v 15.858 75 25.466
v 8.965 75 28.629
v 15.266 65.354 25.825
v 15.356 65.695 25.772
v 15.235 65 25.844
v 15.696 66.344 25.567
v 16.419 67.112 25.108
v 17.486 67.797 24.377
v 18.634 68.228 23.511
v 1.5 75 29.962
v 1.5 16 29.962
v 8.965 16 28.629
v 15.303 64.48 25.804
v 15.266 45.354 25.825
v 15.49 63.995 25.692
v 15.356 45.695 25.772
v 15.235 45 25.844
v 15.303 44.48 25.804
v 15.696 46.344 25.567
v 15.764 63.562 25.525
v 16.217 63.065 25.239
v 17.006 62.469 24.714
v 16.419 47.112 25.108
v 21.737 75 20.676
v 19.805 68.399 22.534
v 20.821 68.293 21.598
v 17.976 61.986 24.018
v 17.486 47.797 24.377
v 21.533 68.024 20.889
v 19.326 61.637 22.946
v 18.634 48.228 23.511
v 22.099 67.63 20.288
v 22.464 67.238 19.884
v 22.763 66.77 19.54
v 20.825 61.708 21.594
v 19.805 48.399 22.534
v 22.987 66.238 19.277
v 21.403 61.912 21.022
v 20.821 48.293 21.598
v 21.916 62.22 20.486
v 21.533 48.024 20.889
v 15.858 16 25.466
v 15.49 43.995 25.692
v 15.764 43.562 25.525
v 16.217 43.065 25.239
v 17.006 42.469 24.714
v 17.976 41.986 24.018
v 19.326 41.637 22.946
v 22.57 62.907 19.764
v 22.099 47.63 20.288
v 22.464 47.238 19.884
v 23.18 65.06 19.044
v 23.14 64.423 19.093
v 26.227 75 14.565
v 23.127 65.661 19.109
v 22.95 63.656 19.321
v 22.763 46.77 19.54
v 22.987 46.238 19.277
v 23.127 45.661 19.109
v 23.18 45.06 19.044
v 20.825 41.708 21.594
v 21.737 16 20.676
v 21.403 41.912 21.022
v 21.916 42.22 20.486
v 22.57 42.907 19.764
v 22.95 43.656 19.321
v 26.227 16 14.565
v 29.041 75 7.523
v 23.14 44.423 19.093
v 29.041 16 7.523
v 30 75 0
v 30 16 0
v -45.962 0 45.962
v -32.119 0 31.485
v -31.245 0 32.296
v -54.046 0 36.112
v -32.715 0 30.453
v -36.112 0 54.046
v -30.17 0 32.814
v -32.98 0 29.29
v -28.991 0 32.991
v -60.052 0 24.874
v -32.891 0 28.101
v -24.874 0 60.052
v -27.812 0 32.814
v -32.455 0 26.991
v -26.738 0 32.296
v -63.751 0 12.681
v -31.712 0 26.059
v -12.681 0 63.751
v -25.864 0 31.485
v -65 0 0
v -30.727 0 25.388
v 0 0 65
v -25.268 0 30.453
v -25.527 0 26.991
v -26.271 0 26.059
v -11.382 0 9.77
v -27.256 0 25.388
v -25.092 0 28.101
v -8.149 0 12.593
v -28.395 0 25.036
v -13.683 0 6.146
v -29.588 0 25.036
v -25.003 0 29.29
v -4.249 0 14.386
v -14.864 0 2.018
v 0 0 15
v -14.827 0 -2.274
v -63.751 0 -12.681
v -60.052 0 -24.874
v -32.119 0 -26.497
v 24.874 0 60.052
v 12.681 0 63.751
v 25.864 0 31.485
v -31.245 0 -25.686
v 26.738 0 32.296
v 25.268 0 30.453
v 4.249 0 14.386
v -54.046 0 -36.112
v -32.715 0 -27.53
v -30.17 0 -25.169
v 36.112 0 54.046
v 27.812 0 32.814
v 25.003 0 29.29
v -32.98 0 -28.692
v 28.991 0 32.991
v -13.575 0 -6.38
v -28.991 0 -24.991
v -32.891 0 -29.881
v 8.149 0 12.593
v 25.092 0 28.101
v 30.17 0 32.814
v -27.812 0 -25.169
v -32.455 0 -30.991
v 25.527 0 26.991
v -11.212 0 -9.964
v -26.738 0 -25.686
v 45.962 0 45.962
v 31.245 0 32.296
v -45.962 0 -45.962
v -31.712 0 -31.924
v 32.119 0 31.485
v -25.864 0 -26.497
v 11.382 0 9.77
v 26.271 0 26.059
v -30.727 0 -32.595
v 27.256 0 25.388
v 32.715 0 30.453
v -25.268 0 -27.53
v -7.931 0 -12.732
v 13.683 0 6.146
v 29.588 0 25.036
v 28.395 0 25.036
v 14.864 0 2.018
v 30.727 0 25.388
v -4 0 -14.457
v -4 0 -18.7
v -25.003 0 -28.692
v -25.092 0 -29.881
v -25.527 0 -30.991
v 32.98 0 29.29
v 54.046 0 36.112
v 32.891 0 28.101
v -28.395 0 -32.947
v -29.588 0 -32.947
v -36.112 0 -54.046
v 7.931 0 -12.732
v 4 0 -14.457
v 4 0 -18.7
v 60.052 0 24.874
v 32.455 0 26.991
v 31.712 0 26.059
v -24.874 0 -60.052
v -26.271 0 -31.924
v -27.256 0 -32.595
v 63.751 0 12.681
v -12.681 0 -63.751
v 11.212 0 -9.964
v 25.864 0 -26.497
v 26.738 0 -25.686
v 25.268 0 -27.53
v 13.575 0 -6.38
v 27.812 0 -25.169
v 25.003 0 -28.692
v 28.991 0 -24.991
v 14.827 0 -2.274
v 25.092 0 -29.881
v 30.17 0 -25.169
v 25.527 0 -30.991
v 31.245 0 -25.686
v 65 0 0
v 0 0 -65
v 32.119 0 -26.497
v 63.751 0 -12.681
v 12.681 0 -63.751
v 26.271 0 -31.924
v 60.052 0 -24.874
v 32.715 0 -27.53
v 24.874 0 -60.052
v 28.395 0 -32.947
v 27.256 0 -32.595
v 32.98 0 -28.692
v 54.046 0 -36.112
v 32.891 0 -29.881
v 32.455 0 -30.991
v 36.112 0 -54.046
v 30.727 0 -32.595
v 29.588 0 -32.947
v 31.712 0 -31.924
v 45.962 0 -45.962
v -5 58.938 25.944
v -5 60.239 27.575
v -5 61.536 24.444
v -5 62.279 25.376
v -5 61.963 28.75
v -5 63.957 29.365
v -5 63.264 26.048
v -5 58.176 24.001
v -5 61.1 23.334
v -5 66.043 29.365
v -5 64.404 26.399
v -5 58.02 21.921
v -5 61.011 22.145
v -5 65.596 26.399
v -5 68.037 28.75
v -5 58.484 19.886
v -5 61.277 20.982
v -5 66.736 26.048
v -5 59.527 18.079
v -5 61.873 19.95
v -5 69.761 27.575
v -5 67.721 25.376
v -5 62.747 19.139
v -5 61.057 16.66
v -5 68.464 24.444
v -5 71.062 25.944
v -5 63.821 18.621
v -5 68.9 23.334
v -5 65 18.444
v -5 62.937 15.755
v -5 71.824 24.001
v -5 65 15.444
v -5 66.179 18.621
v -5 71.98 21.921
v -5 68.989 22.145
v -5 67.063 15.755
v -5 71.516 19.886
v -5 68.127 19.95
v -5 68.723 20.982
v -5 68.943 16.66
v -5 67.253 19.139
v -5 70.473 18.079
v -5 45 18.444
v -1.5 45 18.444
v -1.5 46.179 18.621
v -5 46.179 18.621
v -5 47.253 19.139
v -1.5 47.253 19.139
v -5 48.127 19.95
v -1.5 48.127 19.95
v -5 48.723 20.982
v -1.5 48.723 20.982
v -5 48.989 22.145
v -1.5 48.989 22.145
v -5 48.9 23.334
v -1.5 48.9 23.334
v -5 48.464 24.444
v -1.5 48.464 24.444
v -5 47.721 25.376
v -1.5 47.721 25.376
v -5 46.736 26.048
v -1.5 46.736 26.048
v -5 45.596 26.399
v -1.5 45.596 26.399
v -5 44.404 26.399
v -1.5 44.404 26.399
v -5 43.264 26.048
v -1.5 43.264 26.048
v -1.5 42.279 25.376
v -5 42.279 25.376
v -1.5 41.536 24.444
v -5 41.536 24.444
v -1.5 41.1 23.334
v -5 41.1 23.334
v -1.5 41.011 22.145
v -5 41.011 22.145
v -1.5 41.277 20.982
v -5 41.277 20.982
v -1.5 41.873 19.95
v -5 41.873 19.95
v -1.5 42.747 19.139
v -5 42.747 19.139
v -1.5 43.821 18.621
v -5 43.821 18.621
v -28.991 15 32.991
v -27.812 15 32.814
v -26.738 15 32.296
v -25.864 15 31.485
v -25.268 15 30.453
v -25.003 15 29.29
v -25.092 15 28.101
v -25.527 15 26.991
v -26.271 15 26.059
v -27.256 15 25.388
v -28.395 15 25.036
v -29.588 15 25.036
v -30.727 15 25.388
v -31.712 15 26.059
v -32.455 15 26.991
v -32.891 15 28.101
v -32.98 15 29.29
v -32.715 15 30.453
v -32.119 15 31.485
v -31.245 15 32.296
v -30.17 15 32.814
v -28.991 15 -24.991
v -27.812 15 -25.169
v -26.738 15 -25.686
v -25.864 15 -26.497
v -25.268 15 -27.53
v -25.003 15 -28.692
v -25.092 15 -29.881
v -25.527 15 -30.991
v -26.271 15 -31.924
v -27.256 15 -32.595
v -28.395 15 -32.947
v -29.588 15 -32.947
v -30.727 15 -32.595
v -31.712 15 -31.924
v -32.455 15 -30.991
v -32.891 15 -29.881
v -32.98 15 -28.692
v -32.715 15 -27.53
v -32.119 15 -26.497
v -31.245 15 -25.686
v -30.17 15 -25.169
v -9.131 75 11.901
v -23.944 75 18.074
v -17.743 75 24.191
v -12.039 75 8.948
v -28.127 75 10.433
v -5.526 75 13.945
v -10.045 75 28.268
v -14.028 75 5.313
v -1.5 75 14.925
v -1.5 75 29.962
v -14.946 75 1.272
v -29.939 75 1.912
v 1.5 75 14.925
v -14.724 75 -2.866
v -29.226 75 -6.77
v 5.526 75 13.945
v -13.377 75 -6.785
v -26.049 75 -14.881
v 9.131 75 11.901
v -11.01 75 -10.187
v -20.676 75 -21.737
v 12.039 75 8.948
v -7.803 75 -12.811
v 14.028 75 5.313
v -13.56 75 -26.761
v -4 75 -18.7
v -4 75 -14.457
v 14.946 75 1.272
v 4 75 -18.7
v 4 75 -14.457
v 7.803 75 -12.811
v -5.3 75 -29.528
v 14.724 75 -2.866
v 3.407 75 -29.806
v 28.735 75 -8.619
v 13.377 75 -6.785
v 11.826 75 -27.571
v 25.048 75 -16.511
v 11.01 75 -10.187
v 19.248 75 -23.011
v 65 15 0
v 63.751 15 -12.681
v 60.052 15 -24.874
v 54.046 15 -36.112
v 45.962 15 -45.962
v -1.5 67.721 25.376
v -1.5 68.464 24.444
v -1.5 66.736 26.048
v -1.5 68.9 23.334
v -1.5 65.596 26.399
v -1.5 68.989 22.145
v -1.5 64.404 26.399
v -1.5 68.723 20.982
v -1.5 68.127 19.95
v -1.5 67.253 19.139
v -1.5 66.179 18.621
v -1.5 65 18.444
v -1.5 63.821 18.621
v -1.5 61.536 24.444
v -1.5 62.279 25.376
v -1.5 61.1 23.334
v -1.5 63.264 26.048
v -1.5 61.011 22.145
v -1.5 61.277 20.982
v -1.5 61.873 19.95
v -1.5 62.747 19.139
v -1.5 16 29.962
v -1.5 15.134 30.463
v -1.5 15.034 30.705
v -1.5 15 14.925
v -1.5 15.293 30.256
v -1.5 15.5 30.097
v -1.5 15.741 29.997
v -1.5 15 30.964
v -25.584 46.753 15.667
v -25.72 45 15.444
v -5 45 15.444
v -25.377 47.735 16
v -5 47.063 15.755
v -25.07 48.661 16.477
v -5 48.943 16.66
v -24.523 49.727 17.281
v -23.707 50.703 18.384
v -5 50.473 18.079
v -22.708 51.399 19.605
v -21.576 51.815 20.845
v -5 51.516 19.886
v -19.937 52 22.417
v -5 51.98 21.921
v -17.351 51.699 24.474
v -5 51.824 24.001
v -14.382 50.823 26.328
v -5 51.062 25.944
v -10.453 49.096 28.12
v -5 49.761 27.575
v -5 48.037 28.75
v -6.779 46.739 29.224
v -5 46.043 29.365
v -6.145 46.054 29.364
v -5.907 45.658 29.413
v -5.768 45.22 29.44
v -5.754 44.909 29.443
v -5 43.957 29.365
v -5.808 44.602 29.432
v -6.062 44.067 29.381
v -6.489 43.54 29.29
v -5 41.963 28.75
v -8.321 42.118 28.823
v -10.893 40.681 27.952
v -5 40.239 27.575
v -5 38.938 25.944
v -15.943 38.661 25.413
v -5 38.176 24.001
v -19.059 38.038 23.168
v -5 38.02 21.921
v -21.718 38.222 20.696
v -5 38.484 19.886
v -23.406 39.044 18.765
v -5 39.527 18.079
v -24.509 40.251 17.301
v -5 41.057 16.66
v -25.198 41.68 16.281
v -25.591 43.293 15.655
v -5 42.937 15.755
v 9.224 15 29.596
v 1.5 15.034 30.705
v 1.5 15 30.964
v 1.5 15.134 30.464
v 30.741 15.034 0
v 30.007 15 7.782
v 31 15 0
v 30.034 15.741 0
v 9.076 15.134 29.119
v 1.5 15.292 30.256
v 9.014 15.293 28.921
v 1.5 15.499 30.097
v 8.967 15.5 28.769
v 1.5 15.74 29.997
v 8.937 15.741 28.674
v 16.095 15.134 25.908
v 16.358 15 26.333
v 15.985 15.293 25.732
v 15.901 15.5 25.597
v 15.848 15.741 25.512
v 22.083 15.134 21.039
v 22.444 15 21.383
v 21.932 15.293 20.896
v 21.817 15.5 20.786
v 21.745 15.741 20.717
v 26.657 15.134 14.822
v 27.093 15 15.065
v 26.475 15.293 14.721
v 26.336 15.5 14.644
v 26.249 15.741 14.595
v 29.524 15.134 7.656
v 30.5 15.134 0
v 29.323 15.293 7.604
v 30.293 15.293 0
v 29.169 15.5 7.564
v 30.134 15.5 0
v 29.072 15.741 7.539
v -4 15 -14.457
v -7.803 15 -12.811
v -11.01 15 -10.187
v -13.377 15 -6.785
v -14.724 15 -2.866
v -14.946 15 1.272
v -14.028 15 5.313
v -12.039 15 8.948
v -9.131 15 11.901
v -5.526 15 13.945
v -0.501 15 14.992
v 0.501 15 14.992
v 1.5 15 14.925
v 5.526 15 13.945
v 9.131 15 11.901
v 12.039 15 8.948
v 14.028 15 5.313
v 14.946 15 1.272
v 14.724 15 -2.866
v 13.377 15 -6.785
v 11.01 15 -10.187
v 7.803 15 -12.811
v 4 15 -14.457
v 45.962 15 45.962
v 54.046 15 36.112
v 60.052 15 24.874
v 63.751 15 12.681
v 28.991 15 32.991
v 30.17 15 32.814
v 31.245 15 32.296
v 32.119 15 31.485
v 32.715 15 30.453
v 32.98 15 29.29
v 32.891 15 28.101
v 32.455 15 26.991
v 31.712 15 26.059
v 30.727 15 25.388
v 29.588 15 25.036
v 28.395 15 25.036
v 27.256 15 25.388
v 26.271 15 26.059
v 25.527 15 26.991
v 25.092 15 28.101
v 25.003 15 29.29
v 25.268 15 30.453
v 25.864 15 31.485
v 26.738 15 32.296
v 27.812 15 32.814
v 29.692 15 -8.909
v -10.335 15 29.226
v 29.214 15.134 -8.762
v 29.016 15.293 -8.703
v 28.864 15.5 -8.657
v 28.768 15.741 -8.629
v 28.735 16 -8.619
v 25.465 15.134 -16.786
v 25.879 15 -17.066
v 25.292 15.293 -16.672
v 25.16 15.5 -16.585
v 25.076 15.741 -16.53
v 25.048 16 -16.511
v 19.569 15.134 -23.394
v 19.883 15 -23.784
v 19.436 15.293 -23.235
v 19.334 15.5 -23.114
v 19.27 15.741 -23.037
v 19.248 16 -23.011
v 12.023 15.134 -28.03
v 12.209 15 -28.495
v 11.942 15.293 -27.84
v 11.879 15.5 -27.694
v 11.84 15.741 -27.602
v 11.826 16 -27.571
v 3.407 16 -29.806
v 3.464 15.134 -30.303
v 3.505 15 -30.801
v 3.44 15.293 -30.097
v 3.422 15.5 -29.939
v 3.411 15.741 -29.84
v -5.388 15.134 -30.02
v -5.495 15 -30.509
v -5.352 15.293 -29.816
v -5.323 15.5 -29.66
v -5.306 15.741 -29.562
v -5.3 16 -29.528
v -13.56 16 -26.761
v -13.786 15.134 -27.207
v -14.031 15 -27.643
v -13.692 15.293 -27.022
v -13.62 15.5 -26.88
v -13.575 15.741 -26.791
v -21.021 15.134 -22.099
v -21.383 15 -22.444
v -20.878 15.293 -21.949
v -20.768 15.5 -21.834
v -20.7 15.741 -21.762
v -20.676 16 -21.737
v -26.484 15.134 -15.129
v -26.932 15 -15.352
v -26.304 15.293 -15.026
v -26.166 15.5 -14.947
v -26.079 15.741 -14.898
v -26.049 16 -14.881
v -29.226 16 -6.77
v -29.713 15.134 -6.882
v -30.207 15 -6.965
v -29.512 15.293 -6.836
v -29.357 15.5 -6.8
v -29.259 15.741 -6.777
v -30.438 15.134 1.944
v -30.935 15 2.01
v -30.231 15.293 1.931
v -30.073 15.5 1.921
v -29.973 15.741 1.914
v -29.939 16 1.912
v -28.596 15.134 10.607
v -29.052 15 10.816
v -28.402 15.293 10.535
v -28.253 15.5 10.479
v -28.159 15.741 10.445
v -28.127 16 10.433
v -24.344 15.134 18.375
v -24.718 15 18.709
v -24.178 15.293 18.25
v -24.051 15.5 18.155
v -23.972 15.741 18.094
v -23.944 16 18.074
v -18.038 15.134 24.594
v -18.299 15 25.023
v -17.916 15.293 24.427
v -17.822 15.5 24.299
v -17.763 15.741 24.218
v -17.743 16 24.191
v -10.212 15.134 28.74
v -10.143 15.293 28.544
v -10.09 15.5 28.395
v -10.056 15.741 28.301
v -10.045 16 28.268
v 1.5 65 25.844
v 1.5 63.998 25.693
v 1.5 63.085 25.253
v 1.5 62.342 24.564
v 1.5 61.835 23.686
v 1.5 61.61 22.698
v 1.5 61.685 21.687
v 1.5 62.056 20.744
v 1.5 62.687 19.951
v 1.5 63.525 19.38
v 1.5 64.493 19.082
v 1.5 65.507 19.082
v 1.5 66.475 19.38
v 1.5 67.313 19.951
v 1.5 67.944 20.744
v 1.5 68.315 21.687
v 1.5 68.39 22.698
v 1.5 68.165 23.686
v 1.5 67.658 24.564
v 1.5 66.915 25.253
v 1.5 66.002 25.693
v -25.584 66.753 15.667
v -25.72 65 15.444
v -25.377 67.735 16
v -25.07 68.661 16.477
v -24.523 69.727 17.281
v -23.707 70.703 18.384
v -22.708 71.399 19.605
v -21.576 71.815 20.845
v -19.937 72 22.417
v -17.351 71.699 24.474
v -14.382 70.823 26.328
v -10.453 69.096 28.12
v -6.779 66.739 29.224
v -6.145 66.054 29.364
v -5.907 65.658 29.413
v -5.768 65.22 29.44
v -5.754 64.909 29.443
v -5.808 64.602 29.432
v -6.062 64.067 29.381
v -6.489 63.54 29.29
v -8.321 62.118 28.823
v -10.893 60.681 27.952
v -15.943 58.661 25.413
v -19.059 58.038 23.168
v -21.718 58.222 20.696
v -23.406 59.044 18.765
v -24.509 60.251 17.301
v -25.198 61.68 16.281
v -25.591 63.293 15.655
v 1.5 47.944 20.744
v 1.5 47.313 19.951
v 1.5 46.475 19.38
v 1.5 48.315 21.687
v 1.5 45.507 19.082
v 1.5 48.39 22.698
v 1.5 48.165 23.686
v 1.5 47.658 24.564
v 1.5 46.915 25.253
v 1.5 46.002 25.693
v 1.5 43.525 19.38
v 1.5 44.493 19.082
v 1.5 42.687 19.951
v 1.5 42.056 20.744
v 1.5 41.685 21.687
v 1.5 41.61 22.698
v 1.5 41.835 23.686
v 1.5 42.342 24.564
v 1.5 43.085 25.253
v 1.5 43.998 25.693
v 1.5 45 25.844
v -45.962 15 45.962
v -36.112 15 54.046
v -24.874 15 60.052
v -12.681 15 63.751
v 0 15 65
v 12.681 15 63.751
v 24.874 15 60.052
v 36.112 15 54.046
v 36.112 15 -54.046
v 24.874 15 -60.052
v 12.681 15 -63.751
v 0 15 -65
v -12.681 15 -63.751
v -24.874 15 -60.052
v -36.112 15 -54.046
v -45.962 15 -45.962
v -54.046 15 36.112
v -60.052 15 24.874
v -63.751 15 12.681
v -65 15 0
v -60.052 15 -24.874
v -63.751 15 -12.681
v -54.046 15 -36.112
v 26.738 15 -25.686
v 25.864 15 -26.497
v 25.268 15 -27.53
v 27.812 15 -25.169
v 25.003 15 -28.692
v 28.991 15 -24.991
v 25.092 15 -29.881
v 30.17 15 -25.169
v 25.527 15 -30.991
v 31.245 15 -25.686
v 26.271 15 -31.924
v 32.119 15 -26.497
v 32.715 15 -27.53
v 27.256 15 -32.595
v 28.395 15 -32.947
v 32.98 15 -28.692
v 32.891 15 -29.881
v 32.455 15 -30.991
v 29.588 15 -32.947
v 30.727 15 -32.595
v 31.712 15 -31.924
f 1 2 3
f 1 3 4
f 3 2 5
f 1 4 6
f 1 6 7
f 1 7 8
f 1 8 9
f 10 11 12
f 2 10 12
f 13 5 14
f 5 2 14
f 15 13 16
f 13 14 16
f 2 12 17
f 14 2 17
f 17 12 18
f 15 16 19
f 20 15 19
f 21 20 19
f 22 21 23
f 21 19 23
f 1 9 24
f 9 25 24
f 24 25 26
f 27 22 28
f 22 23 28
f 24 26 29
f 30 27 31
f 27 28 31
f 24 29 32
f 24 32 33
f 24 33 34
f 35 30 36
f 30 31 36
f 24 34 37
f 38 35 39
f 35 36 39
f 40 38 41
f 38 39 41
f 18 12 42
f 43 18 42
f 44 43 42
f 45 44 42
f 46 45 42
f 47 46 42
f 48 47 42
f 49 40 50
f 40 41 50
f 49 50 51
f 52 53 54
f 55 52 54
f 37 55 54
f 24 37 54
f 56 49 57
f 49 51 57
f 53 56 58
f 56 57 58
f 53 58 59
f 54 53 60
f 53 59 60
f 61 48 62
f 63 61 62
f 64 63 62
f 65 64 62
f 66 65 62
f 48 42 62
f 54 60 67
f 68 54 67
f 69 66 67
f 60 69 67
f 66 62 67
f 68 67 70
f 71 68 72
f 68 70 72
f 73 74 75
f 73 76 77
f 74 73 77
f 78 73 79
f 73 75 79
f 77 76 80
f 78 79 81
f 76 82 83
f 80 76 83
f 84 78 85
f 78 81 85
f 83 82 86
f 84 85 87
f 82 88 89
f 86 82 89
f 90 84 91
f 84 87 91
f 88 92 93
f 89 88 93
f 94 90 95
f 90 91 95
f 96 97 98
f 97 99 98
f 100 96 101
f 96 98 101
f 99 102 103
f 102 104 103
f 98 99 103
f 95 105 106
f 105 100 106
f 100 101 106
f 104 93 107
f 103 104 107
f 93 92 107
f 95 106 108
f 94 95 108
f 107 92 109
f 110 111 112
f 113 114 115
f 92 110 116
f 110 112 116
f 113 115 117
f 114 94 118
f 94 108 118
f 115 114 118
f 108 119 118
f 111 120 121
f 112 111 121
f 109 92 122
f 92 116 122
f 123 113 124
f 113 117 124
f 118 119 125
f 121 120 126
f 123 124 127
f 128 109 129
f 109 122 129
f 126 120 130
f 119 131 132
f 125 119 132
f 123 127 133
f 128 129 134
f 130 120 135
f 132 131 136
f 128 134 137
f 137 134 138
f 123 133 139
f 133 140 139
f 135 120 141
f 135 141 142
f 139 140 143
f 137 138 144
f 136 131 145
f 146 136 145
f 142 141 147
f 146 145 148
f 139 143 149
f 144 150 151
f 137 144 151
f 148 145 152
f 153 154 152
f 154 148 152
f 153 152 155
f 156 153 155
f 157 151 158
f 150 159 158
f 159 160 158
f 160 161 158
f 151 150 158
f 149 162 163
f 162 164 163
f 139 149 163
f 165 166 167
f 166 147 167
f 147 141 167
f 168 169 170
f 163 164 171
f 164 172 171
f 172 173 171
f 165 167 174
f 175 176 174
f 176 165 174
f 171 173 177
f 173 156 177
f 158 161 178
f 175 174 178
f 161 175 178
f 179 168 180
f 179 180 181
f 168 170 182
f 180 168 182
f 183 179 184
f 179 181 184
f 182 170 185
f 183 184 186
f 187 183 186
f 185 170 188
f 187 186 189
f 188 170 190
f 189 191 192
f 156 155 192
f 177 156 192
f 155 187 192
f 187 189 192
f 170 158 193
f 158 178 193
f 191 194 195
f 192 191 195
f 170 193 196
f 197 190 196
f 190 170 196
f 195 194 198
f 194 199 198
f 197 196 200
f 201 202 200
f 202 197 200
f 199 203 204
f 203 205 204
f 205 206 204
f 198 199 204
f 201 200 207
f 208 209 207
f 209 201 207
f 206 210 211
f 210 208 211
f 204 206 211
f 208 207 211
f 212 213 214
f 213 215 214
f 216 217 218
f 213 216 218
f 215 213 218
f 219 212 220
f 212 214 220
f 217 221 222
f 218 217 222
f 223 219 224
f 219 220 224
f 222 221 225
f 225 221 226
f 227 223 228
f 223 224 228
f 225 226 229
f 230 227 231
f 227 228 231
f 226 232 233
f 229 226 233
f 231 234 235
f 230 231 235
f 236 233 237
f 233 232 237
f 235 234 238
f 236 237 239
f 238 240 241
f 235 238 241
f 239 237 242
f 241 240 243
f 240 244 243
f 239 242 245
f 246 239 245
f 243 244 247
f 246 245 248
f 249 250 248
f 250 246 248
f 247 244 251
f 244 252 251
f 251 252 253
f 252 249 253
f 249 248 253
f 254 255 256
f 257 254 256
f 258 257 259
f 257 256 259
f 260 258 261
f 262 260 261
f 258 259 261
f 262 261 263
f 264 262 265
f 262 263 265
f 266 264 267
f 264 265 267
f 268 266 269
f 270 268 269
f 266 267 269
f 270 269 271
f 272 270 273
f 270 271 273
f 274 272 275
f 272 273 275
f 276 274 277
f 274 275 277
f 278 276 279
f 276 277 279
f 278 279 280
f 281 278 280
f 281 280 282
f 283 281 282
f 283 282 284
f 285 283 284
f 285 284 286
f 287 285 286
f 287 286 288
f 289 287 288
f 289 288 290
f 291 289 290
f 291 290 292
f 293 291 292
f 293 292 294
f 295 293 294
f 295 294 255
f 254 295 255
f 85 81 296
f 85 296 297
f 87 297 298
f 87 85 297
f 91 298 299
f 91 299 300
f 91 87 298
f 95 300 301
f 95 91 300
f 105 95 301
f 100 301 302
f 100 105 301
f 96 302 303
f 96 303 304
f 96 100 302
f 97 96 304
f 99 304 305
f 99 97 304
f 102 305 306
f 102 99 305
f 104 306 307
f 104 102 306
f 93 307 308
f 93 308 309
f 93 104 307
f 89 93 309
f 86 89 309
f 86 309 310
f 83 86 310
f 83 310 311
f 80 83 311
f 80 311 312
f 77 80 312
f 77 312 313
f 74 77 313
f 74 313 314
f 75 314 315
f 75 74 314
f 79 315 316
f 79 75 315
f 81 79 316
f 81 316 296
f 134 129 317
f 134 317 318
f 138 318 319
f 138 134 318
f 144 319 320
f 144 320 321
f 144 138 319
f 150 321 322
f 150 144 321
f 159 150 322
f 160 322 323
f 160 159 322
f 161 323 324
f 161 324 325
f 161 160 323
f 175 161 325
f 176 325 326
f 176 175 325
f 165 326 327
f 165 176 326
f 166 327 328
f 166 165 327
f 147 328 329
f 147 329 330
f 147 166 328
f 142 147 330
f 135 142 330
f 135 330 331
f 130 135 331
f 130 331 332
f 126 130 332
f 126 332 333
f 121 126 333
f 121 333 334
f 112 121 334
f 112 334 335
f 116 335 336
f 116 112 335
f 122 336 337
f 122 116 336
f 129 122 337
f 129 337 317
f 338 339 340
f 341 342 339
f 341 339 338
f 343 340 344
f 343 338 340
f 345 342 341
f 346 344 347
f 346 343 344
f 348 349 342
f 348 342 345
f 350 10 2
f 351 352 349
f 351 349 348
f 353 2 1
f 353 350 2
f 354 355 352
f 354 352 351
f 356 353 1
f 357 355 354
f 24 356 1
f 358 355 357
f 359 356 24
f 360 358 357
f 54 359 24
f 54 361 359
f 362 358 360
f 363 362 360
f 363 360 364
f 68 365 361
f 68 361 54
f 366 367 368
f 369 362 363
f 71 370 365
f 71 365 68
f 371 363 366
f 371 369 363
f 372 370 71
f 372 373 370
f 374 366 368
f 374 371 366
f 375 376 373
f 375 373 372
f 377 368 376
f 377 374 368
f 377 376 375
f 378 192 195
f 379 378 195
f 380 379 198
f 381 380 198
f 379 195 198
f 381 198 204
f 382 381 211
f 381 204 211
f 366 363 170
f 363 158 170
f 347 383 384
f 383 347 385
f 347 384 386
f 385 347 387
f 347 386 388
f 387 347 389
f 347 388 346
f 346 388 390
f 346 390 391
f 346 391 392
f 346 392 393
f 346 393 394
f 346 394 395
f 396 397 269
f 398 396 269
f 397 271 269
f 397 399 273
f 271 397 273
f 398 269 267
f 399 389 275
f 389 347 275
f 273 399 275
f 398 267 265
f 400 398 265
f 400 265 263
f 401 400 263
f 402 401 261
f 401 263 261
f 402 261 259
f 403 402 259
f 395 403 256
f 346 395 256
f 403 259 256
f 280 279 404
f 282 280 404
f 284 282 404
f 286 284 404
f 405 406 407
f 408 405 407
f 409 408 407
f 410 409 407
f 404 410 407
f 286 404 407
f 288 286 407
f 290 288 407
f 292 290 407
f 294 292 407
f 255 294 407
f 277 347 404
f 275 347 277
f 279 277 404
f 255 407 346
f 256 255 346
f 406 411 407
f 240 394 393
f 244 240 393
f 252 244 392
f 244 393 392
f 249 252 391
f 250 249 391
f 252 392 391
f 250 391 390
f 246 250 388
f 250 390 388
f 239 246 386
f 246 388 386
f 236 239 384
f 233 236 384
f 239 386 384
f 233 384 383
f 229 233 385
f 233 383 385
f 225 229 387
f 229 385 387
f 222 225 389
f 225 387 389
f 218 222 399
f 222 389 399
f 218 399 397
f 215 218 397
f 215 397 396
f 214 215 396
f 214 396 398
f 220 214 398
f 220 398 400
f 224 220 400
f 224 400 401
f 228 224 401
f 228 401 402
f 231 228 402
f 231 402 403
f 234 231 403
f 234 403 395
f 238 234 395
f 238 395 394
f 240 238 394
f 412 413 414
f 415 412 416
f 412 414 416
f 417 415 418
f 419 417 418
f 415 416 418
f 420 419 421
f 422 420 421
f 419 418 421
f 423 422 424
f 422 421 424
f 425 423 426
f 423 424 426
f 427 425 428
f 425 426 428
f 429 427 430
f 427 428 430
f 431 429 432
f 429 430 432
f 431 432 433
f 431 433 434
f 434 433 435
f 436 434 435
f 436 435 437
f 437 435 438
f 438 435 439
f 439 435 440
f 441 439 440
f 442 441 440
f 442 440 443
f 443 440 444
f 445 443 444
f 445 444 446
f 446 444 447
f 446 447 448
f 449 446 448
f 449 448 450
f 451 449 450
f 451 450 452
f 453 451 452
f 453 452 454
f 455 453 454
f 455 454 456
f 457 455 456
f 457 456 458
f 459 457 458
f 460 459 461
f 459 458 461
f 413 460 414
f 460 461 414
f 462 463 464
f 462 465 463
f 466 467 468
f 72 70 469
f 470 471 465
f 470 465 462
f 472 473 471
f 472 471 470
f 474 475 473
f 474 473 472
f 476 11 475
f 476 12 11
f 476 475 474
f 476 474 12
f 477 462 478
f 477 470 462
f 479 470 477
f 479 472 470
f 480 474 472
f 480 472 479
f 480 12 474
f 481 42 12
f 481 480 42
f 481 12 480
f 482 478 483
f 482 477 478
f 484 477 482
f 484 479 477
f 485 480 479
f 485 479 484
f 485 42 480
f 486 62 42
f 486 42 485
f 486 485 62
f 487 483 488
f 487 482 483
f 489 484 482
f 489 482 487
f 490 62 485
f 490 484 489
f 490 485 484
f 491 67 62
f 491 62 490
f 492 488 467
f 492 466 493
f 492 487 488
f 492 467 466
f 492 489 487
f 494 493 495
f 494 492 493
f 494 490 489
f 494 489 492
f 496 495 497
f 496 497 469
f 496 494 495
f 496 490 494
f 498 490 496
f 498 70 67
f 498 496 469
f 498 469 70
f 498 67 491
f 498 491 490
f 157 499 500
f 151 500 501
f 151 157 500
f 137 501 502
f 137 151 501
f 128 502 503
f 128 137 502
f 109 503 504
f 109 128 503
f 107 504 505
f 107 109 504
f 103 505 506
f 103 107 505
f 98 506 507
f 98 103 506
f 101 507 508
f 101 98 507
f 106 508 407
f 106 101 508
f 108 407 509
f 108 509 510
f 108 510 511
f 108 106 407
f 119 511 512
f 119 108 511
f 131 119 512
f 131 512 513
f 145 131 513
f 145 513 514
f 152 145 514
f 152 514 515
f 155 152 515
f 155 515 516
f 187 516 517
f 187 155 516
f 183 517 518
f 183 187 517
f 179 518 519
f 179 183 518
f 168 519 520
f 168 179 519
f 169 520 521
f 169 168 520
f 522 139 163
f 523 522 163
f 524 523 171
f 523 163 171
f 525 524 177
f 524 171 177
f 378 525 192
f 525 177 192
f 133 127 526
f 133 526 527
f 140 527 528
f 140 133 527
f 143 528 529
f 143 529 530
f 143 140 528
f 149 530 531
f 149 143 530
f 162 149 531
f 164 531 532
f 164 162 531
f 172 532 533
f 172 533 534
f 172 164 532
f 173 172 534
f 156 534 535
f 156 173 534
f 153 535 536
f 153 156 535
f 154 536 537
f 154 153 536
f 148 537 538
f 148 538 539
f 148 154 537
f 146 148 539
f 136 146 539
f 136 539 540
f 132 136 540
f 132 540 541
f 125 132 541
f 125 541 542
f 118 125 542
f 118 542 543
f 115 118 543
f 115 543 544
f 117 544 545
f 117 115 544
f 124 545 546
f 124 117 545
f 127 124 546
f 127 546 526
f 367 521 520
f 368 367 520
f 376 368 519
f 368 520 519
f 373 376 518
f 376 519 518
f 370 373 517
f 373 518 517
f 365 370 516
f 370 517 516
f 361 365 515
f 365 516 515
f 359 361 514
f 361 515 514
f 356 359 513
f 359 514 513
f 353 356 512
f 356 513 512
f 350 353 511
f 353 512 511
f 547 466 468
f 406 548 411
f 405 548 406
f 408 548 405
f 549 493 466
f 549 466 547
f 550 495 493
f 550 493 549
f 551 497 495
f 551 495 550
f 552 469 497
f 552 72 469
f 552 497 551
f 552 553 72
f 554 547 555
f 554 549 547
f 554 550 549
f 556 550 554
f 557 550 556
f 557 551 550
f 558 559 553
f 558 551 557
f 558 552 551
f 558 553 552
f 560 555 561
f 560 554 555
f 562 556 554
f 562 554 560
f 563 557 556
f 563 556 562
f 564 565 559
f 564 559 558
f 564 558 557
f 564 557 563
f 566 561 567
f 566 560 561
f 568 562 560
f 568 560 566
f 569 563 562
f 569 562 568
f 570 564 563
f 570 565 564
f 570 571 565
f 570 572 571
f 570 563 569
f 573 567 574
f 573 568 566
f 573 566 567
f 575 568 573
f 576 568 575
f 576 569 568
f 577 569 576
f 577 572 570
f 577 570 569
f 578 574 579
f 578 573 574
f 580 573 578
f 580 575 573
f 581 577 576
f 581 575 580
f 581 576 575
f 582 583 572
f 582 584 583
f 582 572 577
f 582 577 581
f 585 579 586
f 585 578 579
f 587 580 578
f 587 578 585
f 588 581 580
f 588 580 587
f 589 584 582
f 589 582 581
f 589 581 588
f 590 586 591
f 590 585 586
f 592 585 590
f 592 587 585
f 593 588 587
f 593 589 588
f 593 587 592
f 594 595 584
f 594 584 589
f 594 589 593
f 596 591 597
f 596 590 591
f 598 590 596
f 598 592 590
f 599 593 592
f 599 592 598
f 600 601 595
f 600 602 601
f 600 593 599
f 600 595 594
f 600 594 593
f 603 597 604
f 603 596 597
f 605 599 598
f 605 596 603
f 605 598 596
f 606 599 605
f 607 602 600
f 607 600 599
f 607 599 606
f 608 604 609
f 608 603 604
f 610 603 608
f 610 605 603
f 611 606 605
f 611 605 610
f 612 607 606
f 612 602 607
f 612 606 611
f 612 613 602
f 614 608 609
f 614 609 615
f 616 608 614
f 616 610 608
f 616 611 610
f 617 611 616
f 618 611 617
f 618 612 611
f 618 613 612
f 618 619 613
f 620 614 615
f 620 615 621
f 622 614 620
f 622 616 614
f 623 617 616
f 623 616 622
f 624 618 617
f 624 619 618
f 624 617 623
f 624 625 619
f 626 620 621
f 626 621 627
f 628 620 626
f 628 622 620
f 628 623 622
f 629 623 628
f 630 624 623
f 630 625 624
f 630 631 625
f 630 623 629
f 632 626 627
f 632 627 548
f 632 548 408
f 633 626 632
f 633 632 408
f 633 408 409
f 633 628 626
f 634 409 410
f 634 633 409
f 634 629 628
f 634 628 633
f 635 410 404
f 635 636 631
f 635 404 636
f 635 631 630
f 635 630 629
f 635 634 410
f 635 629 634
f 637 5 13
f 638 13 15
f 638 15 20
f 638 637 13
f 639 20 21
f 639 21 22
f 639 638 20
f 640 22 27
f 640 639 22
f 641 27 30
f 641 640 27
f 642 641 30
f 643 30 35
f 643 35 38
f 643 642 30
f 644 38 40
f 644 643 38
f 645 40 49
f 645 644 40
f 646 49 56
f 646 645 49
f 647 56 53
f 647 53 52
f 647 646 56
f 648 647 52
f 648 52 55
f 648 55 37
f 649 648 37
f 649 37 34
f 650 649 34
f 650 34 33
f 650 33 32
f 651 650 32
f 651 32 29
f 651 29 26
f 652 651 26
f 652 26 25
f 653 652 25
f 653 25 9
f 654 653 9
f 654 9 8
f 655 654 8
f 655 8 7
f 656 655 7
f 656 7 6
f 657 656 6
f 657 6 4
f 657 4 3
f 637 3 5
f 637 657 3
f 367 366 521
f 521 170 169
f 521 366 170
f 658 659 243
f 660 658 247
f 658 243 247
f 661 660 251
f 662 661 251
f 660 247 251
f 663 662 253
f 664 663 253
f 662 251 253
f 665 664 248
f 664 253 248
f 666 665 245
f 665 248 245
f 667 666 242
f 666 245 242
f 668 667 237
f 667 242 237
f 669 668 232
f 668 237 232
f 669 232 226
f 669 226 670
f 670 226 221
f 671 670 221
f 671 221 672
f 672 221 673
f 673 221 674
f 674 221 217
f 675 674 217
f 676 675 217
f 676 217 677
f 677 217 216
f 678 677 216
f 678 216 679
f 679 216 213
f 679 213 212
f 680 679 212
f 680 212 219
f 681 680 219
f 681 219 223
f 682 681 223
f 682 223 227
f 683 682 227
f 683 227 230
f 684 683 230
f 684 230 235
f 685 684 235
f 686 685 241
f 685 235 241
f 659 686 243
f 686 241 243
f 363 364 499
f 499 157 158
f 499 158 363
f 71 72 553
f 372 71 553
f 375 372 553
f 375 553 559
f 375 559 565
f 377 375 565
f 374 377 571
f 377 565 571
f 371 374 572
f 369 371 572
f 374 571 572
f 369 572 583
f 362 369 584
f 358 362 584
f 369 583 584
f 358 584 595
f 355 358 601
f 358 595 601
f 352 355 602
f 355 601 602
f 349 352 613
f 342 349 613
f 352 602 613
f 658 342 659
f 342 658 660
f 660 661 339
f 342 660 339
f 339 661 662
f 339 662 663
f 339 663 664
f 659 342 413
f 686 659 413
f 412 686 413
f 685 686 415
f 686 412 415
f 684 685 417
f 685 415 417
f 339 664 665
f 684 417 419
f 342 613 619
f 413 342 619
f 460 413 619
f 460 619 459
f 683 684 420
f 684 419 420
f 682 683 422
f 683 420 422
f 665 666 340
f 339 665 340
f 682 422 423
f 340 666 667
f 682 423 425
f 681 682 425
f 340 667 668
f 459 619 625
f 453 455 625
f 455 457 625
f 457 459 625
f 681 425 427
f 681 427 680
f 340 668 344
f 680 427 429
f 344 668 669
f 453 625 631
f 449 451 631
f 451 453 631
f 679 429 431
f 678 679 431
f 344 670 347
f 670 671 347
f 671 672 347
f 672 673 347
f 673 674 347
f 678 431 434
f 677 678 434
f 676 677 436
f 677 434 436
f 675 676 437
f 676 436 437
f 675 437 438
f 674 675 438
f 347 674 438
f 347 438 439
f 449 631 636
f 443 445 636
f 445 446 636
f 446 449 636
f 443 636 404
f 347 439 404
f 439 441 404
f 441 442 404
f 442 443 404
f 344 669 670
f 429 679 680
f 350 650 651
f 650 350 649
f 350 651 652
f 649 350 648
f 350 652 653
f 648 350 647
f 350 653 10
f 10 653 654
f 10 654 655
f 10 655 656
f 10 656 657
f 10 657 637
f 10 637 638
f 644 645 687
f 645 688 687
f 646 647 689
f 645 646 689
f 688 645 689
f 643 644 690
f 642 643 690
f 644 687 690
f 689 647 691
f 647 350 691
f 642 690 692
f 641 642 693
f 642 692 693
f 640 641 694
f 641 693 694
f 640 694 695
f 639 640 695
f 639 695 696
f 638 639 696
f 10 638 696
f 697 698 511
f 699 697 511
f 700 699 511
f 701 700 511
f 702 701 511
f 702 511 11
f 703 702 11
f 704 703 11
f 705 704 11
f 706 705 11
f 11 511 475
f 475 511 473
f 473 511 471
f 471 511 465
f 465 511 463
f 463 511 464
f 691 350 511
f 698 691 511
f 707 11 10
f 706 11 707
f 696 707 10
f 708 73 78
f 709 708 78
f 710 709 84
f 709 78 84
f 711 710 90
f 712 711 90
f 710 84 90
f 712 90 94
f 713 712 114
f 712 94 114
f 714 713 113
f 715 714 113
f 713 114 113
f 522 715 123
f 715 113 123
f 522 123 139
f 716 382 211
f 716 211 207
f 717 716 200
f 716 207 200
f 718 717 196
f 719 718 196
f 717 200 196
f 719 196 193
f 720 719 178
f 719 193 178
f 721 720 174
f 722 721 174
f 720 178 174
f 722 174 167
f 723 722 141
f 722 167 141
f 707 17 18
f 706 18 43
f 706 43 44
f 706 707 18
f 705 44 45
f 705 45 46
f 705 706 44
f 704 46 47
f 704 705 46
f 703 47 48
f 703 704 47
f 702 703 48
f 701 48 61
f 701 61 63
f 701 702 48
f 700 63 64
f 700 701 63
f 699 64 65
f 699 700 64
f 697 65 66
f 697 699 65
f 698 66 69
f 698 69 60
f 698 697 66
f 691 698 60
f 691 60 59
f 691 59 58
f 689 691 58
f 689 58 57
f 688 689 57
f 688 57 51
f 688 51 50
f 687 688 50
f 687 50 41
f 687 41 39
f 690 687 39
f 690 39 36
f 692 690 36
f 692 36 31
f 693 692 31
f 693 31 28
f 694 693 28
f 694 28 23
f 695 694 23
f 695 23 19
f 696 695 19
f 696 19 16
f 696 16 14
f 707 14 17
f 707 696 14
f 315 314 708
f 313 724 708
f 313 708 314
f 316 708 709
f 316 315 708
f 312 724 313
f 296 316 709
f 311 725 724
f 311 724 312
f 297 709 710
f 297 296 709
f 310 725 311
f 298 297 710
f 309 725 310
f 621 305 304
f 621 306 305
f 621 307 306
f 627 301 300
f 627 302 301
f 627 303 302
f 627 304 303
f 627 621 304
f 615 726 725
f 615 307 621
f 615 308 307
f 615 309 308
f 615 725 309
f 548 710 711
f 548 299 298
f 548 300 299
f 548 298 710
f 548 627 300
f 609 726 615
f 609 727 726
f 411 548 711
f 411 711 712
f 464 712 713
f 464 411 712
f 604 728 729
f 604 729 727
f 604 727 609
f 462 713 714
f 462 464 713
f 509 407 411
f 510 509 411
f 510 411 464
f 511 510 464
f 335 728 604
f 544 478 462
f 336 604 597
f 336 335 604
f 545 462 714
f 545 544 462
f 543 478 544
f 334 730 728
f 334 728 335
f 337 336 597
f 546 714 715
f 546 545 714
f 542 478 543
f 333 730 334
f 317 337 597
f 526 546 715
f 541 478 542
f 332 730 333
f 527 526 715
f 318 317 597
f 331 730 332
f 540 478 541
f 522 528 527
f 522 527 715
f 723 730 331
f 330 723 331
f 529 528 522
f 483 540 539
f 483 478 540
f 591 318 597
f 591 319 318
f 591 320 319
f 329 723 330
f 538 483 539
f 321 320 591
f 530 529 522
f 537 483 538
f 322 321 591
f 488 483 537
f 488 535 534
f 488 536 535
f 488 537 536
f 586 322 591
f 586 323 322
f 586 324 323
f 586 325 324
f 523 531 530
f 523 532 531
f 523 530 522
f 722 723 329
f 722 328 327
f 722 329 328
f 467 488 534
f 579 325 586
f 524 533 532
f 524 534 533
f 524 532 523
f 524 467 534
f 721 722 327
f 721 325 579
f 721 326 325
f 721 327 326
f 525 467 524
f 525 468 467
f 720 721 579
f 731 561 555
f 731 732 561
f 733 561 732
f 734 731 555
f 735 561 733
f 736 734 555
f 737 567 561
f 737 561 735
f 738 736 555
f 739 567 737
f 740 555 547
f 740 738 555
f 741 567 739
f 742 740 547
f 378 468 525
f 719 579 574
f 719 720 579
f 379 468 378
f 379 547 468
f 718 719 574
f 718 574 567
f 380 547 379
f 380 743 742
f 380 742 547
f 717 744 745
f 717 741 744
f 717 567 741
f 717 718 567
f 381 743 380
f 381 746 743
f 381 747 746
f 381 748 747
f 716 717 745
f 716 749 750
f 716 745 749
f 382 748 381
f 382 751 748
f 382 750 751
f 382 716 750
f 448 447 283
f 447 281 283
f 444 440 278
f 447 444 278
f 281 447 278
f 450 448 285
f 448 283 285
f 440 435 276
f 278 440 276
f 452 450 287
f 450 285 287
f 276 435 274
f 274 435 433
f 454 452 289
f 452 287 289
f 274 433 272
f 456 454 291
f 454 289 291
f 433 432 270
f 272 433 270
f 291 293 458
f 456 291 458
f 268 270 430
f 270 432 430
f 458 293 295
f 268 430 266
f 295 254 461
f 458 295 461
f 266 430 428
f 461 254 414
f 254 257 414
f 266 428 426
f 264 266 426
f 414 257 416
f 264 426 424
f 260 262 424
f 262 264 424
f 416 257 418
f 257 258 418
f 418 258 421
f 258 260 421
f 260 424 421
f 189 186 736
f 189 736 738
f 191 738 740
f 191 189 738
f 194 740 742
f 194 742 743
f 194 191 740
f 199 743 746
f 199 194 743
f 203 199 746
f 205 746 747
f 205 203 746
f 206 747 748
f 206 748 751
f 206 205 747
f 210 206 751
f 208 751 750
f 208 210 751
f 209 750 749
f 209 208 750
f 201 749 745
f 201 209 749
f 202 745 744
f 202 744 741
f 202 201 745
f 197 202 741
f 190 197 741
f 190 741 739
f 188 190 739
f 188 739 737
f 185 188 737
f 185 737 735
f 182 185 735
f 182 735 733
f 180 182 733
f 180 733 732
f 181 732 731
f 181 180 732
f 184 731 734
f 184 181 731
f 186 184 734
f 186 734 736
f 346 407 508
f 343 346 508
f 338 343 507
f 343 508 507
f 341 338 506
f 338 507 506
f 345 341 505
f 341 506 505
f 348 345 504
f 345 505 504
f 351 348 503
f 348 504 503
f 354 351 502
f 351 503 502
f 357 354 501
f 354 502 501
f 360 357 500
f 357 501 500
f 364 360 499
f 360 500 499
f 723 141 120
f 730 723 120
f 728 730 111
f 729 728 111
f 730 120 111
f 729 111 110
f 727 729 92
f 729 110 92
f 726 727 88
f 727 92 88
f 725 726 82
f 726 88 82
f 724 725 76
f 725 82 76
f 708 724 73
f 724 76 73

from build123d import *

# Parameters (mm, degrees)
SKETCH3_R           = 4
BOSS_EXTRUDE1_DEPTH = 15
BOSS_EXTRUDE2_DEPTH = 60
SKETCH6_R           = 3.4
CUT_EXTRUDE1_DEPTH  = 107.024394791
SKETCH7_R           = 4
CUT_EXTRUDE2_DEPTH  = 107.024394862
CUT_EXTRUDE3_START  = -5
SKETCH10_R          = 7
SKETCH10_R_2        = 3.4
CUT_EXTRUDE3_DEPTH  = 102.024394862
BOSS_EXTRUDE3_DEPTH = 15
FILLET1_R           = 1


with BuildPart() as part:
    # Sketch3 → Boss-Extrude1 (new body)
    with BuildSketch(Plane(origin=(0, 0, 0), x_dir=(1, 0, 0), z_dir=(0, 1, 0))):
        with BuildLine():
            ThreePointArc((-50.387748924, -18.119611268), (-46.048367083, 0), (-50.387748924, 18.119611268))
            ThreePointArc((-50.387748924, 18.119611268), (-45.961940777, 45.961940777), (-18.119611268, 50.387748924))
            ThreePointArc((-18.119611268, 50.387748924), (0, 46.048367083), (18.119611268, 50.387748924))
            ThreePointArc((18.119611268, 50.387748924), (45.961940777, 45.961940777), (50.387748924, 18.119611268))
            ThreePointArc((50.387748924, 18.119611268), (46.048367083, 0), (50.387748924, -18.119611268))
            ThreePointArc((50.387748924, -18.119611268), (45.961940777, -45.961940777), (18.119611268, -50.387748924))
            ThreePointArc((18.119611268, -50.387748924), (0, -46.048367083), (-18.119611268, -50.387748924))
            ThreePointArc((-18.119611268, -50.387748924), (-45.961940777, -45.961940777), (-50.387748924, -18.119611268))
        make_face()
        with Locations(Location((28.991378029, 28.991378029, 0), (0, 0, 270))):
            Circle(SKETCH3_R, mode=Mode.SUBTRACT)
        with Locations(Location((28.991378029, -28.991378029, 0), (0, 0, 270))):
            Circle(SKETCH3_R, mode=Mode.SUBTRACT)
        with Locations(Location((-28.991378029, -28.991378029, 0), (0, 0, 270))):
            Circle(SKETCH3_R, mode=Mode.SUBTRACT)
        with Locations(Location((-28.991378029, 28.991378029, 0), (0, 0, 270))):
            Circle(SKETCH3_R, mode=Mode.SUBTRACT)
        with BuildLine():
            Line((-4, 18.7), (-4, 14.456832295))
            ThreePointArc((-4, 14.456832295), (0, -15), (4, 14.456832295))
            Line((4, 14.456832295), (4, 18.7))
            Line((4, 18.7), (-4, 18.7))
        make_face(mode=Mode.SUBTRACT)
    extrude(amount=BOSS_EXTRUDE1_DEPTH)

    # Sketch4 → Boss-Extrude2 (add)
    with BuildSketch(Plane(origin=(0, 15, 0), x_dir=(1, 0, 0), z_dir=(0, 1, 0))):
        with BuildLine():
            Line((-4, 14.456832295), (-4, 18.7))
            Line((-4, 18.7), (4, 18.7))
            Line((4, 18.7), (4, 14.456832295))
            ThreePointArc((4, 14.456832295), (14.945994408, -1.271711896), (1.5, -14.924811557))
            Line((1.5, -14.924811557), (1.5, -29.962476533))
            ThreePointArc((1.5, -29.962476533), (21.737065119, -20.676073128), (30, 0))
            ThreePointArc((30, 0), (-20.676073128, 21.737065119), (-1.5, -29.962476533))
            Line((-1.5, -29.962476533), (-1.5, -14.924811557))
            ThreePointArc((-1.5, -14.924811557), (-14.945994408, -1.271711896), (-4, 14.456832295))
        make_face()
    extrude(amount=BOSS_EXTRUDE2_DEPTH)

    # Sketch6 → Cut-Extrude1 (cut, through all)
    with BuildSketch(Plane(origin=(0, 0, 0), x_dir=(0, 0, -1), z_dir=(1, 0, 0))):
        with Locations(Location((-22.443644045, 65, 0), (0, 0, 180))):
            Circle(SKETCH6_R)
        with Locations(Location((-22.443644045, 45, 0), (0, 0, 180))):
            Circle(SKETCH6_R)
    extrude(amount=CUT_EXTRUDE1_DEPTH, mode=Mode.SUBTRACT)

    # Sketch7 → Cut-Extrude2 (cut, through all)
    with BuildSketch(Plane(origin=(0, 0, 0), x_dir=(0, 0, -1), z_dir=(1, 0, 0))):
        with Locations((-22.443644045, 65)):
            Circle(SKETCH7_R)
        with Locations((-22.443644045, 45)):
            Circle(SKETCH7_R)
    extrude(amount=-CUT_EXTRUDE2_DEPTH, mode=Mode.SUBTRACT)

    # Sketch10 → Cut-Extrude3 (cut, through all)
    # profile 1 of 2: a face of its own
    with BuildSketch(Plane(origin=(0, 0, 0), x_dir=(0, 0, -1), z_dir=(1, 0, 0)).offset(CUT_EXTRUDE3_START)):
        with Locations((-22.443644045, 65)):
            Circle(SKETCH10_R)
        with Locations(Location((-22.443644045, 65, 0), (0, 0, 180))):
            Circle(SKETCH10_R_2, mode=Mode.SUBTRACT)
    # profile 2 of 2: a face of its own
    with BuildSketch(Plane(origin=(0, 0, 0), x_dir=(0, 0, -1), z_dir=(1, 0, 0)).offset(CUT_EXTRUDE3_START)):
        with Locations((-22.443644045, 45)):
            Circle(SKETCH10_R)
        with Locations(Location((-22.443644045, 45, 0), (0, 0, 180))):
            Circle(SKETCH10_R_2, mode=Mode.SUBTRACT)
    extrude(amount=-CUT_EXTRUDE3_DEPTH, mode=Mode.SUBTRACT)

    # Sketch11 → Boss-Extrude3 (add)
    with BuildSketch(Plane(origin=(0, 0, 0), x_dir=(1, 0, 0), z_dir=(0, 1, 0))):
        with BuildLine():
            ThreePointArc((-50.387748924, 18.119611268), (-52.693787753, 32.759105894), (-45.961940644, 45.96194091))
            ThreePointArc((-45.961940644, 45.96194091), (-65, 1.62e-07), (-45.961940873, -45.961940681))
            ThreePointArc((-45.961940873, -45.961940681), (-52.693787778, -32.759105733), (-50.387748924, -18.119611268))
            ThreePointArc((-50.387748924, -18.119611268), (-46.048367083, 0), (-50.387748924, 18.119611268))
        make_face()
        with BuildLine():
            ThreePointArc((18.119611268, 50.387748924), (32.759105845, 52.693787761), (45.961940841, 45.961940713))
            ThreePointArc((45.961940841, 45.961940713), (1.4e-07, 65), (-45.961940644, 45.96194091))
            ThreePointArc((-45.961940644, 45.96194091), (-32.759105708, 52.693787782), (-18.119611268, 50.387748924))
            ThreePointArc((-18.119611268, 50.387748924), (0, 46.048367083), (18.119611268, 50.387748924))
        make_face()
        with BuildLine():
            ThreePointArc((-45.961940873, -45.961940681), (-8.4e-08, -65), (45.961940754, -45.9619408))
            ThreePointArc((45.961940754, -45.9619408), (32.759105785, -52.69378777), (18.119611268, -50.387748924))
            ThreePointArc((18.119611268, -50.387748924), (0, -46.048367083), (-18.119611268, -50.387748924))
            ThreePointArc((-18.119611268, -50.387748924), (-32.759105868, -52.693787757), (-45.961940873, -45.961940681))
        make_face()
        with BuildLine():
            ThreePointArc((45.961940754, -45.9619408), (60.052169607, -24.874423119), (65, 0))
            ThreePointArc((65, 0), (60.052169631, 24.874423062), (45.961940841, 45.961940713))
            ThreePointArc((45.961940841, 45.961940713), (52.693787775, 32.759105756), (50.387748924, 18.119611268))
            ThreePointArc((50.387748924, 18.119611268), (46.048367083, 0), (50.387748924, -18.119611268))
            ThreePointArc((50.387748924, -18.119611268), (52.693787765, -32.759105817), (45.961940754, -45.9619408))
        make_face()
    extrude(amount=BOSS_EXTRUDE3_DEPTH)

    # Fillet1
    fillet1_edges = [part.edges().sort_by_distance(p)[0] for p in [
        (0, 15, -30),
    ]]
    fillet(fillet1_edges, radius=FILLET1_R)


solid = part.part
